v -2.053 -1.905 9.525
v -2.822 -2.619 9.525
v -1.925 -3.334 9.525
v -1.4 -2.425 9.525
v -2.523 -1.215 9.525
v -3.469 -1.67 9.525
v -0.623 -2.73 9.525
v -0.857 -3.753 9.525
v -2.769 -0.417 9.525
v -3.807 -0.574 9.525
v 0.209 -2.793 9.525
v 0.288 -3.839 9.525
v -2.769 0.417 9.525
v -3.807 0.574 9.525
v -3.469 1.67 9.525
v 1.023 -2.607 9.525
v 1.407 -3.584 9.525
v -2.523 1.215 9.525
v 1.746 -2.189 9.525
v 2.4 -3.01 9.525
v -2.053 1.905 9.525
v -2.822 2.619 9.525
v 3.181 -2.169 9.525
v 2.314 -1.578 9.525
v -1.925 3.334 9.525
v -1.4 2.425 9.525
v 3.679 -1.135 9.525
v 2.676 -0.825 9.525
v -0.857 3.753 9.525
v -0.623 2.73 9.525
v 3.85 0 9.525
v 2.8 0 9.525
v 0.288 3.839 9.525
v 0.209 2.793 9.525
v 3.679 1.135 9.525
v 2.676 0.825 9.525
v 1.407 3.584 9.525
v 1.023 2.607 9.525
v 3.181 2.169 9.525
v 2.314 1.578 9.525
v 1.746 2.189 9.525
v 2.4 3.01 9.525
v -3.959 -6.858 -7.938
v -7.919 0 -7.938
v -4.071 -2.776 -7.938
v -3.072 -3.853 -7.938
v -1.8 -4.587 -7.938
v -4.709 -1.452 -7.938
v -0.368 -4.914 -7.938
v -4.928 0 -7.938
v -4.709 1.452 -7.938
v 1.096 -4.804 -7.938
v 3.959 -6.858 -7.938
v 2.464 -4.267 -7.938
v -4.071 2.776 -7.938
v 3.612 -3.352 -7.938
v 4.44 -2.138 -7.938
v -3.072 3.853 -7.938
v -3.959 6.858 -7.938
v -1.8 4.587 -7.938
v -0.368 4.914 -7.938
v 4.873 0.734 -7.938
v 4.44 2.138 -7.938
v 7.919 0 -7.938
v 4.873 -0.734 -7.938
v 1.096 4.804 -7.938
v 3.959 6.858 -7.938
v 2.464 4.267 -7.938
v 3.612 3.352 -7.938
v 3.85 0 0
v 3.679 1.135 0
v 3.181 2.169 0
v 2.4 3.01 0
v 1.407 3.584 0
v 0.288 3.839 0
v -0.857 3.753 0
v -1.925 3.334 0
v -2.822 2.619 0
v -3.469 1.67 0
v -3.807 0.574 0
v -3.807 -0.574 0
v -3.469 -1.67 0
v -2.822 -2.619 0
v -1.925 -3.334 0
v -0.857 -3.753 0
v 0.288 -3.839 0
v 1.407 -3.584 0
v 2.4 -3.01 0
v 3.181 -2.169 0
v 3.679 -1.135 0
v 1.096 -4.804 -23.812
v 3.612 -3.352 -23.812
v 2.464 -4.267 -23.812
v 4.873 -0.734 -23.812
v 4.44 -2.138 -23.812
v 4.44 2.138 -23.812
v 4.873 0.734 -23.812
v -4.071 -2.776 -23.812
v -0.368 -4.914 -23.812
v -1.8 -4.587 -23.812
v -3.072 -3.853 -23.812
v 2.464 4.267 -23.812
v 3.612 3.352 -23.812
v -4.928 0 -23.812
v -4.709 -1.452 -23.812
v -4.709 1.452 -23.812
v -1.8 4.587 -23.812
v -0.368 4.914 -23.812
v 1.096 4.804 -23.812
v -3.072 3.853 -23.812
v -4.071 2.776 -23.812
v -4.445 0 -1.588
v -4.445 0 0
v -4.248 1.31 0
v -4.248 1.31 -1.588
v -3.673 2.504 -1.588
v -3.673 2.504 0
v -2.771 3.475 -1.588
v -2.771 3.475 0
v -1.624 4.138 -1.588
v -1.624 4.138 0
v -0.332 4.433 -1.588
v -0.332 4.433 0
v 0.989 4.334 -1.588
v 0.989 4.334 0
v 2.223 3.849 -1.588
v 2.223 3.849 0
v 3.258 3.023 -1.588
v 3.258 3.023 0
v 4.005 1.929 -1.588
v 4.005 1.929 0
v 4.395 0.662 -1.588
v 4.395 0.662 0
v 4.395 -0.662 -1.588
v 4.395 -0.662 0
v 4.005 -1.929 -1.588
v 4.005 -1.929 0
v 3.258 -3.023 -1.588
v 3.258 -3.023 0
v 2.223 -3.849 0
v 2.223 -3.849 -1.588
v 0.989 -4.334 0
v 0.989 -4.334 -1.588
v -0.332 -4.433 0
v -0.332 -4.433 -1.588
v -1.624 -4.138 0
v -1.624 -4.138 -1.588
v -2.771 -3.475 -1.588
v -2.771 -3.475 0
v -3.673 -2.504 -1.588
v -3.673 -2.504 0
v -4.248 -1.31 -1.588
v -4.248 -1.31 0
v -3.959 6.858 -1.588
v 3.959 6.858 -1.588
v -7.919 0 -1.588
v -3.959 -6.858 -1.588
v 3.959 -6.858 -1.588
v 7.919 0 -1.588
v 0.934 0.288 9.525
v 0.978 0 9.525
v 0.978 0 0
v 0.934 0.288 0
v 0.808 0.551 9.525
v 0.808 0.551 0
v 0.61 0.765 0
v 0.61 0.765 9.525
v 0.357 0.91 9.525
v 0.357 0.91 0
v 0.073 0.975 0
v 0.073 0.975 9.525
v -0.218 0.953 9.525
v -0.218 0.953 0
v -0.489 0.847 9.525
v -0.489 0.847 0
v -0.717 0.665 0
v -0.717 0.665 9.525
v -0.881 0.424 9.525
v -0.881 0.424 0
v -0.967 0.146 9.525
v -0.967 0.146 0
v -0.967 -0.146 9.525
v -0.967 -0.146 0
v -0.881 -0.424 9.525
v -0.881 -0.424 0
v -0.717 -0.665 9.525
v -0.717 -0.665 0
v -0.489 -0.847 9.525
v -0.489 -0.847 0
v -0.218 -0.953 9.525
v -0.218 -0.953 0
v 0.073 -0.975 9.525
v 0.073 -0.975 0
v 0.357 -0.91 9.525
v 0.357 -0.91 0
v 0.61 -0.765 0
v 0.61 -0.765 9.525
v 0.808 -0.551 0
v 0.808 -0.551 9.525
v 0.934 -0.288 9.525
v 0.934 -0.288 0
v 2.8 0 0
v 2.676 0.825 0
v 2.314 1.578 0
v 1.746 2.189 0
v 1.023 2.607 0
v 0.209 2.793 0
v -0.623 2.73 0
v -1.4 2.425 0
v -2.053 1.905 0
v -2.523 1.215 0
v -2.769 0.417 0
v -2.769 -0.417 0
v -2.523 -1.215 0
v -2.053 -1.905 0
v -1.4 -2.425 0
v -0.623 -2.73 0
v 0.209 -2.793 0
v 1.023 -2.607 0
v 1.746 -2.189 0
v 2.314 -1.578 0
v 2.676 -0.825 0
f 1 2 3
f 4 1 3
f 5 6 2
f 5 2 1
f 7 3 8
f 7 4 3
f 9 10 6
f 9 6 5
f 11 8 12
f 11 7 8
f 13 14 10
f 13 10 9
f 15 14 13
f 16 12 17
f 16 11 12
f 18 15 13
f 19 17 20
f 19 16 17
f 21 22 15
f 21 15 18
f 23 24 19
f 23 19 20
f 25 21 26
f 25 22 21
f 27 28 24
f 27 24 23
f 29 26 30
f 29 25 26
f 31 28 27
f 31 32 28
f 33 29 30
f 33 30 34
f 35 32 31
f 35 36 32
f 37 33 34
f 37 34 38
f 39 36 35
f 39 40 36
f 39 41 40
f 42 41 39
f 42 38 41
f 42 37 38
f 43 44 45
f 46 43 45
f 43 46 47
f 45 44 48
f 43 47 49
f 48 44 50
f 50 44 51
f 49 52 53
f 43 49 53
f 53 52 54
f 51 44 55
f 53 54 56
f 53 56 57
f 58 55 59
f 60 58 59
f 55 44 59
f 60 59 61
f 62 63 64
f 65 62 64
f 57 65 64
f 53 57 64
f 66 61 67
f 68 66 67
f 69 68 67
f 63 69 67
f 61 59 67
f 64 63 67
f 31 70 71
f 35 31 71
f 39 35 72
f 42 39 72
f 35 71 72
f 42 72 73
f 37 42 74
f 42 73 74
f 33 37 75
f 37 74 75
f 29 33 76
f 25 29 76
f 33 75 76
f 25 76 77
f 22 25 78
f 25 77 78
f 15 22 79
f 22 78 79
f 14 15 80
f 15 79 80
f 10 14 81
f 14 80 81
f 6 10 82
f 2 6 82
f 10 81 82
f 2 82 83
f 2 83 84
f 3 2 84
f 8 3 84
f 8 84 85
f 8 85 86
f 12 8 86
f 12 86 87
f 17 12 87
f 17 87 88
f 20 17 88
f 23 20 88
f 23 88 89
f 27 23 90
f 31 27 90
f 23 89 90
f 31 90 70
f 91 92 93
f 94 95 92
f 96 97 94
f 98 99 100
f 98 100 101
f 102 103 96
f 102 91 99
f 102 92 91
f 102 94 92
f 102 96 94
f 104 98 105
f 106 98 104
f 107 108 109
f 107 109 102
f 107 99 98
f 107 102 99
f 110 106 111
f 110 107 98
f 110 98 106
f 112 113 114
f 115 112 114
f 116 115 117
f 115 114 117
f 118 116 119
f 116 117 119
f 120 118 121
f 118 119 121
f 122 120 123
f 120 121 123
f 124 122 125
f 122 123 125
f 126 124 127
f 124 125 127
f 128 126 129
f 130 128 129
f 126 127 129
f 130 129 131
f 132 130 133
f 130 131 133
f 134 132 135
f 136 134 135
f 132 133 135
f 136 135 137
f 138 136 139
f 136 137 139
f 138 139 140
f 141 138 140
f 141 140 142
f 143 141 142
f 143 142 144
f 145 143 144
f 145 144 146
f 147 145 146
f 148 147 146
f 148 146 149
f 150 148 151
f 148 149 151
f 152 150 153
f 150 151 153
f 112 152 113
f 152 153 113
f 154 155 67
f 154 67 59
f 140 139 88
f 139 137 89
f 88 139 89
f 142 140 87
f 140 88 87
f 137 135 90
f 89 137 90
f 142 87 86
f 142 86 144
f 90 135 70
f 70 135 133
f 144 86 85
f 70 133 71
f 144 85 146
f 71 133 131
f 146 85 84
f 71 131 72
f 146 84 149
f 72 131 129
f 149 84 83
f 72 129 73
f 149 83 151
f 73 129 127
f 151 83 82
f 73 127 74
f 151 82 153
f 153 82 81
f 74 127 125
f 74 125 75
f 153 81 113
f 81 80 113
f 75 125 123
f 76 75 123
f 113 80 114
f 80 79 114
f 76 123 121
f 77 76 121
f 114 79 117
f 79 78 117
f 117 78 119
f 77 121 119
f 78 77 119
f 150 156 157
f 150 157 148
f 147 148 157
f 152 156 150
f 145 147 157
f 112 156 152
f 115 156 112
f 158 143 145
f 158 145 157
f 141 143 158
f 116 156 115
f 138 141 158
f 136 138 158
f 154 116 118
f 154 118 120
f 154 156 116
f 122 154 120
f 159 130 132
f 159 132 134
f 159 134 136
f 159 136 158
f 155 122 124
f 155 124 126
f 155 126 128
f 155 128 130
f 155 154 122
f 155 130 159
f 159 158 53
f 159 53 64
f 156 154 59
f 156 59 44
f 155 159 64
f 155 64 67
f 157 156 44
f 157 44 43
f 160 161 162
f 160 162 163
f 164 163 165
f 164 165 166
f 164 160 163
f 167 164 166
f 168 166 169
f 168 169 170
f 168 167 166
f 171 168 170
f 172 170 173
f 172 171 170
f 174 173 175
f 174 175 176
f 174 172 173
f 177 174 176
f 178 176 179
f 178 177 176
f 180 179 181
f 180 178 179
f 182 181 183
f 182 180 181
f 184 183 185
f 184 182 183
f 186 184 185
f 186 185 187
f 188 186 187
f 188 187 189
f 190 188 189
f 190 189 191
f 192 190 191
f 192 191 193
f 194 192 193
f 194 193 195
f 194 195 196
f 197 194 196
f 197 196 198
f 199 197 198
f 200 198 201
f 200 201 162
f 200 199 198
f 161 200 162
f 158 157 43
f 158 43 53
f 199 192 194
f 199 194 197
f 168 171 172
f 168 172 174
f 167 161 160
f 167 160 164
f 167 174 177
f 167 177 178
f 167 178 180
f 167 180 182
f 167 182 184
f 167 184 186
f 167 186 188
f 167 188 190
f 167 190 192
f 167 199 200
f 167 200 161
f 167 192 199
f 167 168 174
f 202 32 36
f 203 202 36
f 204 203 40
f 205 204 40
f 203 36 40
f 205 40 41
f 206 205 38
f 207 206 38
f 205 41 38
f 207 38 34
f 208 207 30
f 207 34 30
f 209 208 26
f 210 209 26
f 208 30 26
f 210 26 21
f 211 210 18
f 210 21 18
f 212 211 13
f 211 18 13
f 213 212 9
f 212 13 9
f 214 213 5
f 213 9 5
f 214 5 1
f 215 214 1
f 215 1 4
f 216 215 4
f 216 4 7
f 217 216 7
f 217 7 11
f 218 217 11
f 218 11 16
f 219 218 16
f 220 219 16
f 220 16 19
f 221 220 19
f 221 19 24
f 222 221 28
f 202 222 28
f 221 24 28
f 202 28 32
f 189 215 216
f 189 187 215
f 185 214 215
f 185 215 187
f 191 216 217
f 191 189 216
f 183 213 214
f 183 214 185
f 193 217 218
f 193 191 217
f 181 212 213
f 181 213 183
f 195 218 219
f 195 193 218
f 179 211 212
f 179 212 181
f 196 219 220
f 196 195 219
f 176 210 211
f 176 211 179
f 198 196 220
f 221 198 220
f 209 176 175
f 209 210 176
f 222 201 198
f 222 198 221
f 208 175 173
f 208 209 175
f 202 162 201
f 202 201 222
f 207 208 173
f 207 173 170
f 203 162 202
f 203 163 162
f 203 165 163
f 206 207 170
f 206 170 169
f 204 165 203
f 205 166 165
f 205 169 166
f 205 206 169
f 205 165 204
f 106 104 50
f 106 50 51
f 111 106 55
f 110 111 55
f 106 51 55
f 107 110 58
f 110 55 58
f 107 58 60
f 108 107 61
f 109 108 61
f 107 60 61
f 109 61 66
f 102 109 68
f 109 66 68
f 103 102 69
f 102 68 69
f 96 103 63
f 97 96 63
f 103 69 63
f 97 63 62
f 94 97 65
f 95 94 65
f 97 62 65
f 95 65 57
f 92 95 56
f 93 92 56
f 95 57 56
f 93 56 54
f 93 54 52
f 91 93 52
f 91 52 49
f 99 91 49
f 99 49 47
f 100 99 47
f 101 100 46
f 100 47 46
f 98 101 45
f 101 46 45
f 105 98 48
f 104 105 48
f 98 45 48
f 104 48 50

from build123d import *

# Parameters (mm, degrees)
SKETCH1_R          = 3.85
EXTRUDE1_DEPTH     = 9.525
SKETCH2_R          = 4.445
EXTRUDE2_DEPTH     = 1.5875
EXTRUDE3_DEPTH     = 6.35
SKETCH4_R          = 4.9276
EXTRUDE4_DEPTH     = 15.875
SKETCH5_R          = 2.80042078
SKETCH5_R_2        = 0.97787642
CUT_EXTRUDE1_DEPTH = 9.525


with BuildPart() as part:
    # Sketch1 → Extrude1 (new body)
    with BuildSketch(Plane.XY):
        Circle(SKETCH1_R)
    extrude(amount=EXTRUDE1_DEPTH)

    # Sketch2 → Extrude2 (add)
    with BuildSketch(Plane(origin=(0, 0, 0), x_dir=(-1, 0, 0), z_dir=(0, 0, -1))):
        Circle(SKETCH2_R)
    extrude(amount=EXTRUDE2_DEPTH)

    # Sketch3 → Extrude3 (add)
    with BuildSketch(Plane(origin=(0, 0, -1.5875), x_dir=(-1, 0, 0), z_dir=(0, 0, -1))):
        Polygon((-3.959468146, 6.858), (3.959468146, 6.858), (7.918936292, 0), (3.959468146, -6.858), (-3.959468146, -6.858), (-7.918936292, 0), align=None)
    extrude(amount=EXTRUDE3_DEPTH)

    # Sketch4 → Extrude4 (add)
    with BuildSketch(Plane(origin=(0, 0, -7.9375), x_dir=(-1, 0, 0), z_dir=(0, 0, -1))):
        Circle(SKETCH4_R)
    extrude(amount=EXTRUDE4_DEPTH)

    # Sketch5 → Cut-Extrude1 (cut)
    with BuildSketch(Plane.XY.offset(9.525)):
        Circle(SKETCH5_R)
        Circle(SKETCH5_R_2, mode=Mode.SUBTRACT)
    extrude(amount=-CUT_EXTRUDE1_DEPTH, mode=Mode.SUBTRACT)


solid = part.part
